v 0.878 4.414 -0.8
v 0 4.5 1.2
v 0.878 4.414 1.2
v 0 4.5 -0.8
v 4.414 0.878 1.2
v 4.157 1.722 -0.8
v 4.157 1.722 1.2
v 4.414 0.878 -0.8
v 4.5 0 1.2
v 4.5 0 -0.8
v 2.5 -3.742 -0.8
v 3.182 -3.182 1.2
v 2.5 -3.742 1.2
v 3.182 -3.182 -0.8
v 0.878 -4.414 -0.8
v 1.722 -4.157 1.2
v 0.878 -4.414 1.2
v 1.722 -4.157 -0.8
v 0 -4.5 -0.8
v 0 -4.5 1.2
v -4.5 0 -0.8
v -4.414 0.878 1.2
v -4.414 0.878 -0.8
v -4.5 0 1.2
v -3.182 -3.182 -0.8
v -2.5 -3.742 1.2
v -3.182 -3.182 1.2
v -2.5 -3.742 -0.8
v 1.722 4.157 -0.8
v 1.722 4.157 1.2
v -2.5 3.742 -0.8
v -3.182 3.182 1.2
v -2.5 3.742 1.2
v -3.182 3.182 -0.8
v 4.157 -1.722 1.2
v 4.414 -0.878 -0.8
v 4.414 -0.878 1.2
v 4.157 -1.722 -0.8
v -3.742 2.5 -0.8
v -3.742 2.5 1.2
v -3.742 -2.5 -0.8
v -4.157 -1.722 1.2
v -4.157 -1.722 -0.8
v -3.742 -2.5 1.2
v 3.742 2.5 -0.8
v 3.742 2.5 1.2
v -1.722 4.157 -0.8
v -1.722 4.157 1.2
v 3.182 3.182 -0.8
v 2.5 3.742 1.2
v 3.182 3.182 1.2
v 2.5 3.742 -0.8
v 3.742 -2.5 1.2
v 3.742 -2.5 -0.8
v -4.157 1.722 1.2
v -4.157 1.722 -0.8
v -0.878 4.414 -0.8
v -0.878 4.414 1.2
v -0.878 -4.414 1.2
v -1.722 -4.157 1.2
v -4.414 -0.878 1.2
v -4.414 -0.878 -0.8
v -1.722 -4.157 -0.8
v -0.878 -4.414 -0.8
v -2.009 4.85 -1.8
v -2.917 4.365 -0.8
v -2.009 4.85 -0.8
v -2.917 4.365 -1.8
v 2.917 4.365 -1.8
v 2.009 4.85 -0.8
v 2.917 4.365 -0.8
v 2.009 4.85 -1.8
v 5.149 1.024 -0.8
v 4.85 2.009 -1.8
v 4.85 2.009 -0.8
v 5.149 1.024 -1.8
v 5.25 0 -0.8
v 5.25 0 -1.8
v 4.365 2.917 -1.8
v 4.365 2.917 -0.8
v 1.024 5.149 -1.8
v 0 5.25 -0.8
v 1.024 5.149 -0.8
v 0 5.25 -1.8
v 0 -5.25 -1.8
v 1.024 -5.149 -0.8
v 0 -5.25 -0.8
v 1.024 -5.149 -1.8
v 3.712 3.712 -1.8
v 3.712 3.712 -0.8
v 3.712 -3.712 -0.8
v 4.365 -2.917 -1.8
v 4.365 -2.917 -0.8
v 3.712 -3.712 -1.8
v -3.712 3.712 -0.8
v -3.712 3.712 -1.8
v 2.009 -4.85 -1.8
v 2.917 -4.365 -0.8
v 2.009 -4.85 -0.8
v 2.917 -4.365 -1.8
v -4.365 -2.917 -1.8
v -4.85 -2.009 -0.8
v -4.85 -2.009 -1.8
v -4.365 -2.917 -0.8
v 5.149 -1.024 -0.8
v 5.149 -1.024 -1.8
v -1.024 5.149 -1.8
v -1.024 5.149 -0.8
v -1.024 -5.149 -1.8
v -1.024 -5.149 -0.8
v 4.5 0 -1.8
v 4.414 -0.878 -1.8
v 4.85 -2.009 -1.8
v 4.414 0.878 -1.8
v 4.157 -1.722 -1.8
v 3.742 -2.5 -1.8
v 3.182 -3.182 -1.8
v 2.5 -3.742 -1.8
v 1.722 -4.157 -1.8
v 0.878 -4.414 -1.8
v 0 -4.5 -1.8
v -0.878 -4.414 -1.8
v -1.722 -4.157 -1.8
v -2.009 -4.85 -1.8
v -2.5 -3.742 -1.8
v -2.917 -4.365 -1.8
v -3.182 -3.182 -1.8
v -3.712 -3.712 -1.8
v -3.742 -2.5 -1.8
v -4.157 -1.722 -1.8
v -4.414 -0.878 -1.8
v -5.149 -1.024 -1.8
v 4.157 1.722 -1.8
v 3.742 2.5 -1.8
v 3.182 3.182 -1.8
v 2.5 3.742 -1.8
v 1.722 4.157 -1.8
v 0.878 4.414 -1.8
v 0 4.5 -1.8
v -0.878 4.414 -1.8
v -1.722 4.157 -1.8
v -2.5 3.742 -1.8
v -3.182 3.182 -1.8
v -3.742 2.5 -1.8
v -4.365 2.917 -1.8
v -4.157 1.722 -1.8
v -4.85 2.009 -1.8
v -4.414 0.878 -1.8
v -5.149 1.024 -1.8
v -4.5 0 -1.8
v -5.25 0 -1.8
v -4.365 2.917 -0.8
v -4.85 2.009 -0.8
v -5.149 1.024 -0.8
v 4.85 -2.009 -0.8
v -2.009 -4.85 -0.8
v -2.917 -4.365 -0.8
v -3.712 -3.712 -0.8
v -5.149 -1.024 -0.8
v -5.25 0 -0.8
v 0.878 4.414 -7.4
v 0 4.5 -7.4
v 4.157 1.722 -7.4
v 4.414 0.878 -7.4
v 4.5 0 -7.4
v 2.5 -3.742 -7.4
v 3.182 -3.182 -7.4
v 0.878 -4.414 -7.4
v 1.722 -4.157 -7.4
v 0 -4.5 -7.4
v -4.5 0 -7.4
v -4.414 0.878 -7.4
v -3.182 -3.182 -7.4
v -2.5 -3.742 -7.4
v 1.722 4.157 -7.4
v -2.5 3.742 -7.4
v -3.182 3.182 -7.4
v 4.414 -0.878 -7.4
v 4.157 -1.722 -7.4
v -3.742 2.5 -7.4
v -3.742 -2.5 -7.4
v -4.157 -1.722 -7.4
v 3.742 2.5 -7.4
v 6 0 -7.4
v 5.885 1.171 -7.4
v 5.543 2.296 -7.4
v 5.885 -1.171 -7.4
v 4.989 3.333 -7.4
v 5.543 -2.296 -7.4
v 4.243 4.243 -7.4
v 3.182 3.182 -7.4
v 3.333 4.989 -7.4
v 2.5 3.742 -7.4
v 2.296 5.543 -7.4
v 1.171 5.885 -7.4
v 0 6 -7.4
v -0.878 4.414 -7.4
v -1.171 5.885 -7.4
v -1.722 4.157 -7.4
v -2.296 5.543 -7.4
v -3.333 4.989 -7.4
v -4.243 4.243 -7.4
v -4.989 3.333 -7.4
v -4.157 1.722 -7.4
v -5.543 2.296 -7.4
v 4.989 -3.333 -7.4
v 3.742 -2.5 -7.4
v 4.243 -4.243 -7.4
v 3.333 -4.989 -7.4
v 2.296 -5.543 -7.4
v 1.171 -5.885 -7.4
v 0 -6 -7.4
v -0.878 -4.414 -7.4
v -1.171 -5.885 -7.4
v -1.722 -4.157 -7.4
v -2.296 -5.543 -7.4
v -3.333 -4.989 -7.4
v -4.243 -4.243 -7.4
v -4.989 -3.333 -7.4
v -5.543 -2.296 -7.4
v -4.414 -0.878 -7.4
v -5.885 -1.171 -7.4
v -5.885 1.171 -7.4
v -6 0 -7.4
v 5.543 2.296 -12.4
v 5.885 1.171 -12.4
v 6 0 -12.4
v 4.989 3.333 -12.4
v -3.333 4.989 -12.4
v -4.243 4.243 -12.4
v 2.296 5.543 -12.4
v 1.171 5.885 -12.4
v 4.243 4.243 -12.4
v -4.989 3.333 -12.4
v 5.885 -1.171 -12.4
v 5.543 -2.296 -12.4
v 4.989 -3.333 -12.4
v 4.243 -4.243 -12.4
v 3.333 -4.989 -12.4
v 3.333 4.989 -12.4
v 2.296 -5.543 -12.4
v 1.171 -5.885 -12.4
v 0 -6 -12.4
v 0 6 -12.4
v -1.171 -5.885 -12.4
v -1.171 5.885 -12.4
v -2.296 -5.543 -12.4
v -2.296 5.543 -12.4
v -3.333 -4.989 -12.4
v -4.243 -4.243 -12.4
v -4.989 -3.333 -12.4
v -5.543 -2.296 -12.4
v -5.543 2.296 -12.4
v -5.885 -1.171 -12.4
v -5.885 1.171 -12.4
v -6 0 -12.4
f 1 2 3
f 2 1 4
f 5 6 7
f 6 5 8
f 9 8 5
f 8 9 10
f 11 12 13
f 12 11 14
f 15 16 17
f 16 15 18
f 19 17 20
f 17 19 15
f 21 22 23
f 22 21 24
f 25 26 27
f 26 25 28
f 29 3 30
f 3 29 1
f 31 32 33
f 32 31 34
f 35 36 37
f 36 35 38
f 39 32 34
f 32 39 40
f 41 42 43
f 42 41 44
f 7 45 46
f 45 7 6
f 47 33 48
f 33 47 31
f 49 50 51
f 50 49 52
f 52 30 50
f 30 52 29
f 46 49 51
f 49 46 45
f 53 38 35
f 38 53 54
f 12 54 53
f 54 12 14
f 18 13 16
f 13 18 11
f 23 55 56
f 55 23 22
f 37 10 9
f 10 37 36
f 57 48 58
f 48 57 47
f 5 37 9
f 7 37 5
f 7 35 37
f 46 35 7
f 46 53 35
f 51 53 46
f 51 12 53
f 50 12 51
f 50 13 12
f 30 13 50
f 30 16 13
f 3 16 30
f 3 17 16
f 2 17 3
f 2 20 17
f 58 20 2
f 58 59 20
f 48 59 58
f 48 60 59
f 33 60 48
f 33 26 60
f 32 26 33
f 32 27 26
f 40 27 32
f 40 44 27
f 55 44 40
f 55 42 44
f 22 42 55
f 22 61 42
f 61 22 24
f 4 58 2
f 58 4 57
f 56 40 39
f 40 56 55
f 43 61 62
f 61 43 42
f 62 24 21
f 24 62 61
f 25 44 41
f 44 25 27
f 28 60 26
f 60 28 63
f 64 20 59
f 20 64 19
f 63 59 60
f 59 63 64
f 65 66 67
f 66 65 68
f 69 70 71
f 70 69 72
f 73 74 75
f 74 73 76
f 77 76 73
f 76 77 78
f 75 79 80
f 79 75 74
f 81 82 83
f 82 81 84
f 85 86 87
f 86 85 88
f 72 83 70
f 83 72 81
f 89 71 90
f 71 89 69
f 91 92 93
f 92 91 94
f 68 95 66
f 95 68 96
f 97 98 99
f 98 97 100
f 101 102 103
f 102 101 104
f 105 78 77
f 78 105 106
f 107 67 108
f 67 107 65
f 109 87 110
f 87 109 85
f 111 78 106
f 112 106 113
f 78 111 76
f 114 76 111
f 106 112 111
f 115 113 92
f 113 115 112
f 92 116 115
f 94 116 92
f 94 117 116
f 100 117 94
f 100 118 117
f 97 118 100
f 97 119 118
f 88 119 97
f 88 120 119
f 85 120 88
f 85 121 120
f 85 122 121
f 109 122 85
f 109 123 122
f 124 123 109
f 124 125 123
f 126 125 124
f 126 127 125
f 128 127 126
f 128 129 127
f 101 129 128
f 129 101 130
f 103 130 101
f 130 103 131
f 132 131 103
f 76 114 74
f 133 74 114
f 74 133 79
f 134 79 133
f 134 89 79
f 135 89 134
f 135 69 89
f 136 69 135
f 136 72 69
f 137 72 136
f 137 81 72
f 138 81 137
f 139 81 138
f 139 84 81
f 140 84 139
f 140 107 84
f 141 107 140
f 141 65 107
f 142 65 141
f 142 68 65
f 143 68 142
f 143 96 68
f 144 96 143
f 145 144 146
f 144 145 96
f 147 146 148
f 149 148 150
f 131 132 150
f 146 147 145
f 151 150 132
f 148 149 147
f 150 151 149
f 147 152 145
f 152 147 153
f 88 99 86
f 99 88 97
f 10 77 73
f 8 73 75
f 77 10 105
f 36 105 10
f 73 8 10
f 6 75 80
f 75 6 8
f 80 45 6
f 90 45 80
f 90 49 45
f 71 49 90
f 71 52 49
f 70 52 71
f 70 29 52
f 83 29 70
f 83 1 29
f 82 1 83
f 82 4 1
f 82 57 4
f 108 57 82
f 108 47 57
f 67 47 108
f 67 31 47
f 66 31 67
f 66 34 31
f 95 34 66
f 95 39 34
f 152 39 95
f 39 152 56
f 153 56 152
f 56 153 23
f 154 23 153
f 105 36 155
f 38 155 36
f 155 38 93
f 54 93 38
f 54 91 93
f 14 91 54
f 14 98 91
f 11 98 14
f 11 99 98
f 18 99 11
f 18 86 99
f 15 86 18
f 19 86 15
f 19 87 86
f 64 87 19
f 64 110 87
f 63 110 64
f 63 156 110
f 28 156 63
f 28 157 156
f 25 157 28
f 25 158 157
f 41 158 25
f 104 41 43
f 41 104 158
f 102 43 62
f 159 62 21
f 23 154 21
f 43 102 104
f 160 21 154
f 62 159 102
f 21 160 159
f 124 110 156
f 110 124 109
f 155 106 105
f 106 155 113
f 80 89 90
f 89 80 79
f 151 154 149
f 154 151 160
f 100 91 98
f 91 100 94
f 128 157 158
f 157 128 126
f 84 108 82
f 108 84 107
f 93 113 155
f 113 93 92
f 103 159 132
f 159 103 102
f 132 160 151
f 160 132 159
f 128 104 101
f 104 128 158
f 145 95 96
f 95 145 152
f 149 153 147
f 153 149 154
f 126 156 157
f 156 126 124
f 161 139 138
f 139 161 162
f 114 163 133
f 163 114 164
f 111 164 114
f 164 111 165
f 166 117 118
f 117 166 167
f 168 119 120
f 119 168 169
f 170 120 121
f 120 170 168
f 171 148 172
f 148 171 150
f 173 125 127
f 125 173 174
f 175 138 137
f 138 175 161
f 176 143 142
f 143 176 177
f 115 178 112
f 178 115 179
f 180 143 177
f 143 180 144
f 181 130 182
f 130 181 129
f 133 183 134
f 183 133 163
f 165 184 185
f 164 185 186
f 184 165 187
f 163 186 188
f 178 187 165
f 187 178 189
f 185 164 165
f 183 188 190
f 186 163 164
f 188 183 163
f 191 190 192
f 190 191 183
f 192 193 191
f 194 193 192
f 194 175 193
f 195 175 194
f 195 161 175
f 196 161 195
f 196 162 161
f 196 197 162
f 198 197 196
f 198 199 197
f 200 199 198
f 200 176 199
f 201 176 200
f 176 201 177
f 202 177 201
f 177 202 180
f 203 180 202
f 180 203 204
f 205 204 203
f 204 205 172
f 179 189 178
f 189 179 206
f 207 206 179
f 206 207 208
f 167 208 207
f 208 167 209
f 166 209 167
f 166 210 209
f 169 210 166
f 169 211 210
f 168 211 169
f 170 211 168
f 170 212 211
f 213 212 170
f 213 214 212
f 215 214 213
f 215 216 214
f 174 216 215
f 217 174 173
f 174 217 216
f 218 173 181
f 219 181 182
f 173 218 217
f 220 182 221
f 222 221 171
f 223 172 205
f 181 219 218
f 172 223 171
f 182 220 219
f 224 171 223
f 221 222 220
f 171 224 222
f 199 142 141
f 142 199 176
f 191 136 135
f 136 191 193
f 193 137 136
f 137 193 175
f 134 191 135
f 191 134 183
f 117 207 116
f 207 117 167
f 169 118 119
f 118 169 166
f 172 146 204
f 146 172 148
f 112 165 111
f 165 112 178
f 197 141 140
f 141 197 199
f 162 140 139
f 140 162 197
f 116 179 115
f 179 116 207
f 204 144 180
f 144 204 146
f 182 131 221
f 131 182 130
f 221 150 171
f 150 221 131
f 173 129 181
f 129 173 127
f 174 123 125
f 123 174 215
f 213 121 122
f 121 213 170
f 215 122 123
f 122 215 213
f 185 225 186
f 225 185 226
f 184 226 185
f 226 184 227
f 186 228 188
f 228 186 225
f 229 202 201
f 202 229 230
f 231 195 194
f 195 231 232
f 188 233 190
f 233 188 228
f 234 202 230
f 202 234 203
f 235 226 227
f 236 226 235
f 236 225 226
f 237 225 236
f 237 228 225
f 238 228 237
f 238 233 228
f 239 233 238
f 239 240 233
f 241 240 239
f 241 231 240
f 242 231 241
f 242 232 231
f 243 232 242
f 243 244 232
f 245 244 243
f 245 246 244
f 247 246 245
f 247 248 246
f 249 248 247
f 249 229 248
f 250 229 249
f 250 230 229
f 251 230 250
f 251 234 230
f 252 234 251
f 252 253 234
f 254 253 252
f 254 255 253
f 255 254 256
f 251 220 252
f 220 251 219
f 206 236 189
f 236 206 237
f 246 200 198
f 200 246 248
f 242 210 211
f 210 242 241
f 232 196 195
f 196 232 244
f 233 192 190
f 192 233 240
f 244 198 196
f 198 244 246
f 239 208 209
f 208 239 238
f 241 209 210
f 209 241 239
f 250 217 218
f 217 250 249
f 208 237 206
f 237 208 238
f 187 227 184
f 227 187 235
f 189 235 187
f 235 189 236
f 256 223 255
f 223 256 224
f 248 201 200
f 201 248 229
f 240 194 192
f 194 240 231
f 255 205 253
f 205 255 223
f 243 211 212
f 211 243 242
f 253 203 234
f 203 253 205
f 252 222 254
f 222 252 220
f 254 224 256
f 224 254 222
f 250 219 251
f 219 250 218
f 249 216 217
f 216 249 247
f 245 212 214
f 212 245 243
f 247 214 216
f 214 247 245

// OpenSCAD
// Parameters
shaft_diameter_mm = 5; //[2.5:10:0.1]
length_under_head_mm = 10; //[5:20:0.1]
head_diameter_mm = 9; //[4.5:18:0.1]
head_height_mm = 2.4; //[1.2:4.8:0.1]
washer_diameter_mm = 10.5; //[6:21:0.1]
washer_thickness_mm = 1; //[0.5:2:0.1]
spacer_outer_diameter_mm = 9; //[5:18:0.1]
spacer_height_mm = 6; //[3:12:0.1]
buzzer_diameter_mm = 12; //[6:24:0.1]
buzzer_height_mm = 5; //[2.5:10:0.1]
overlap_mm = 0.8; //[0.5:2:0.1]

// Screw and Washer - complete geometry
module screw_and_washer() {
  color("DimGray") {
    // Shaft
    translate([0, 0, -head_height_mm/2 - length_under_head_mm/2 + overlap_mm/2])
      cylinder(h=length_under_head_mm, r=shaft_diameter_mm/2, center=true, $fn=32);
    // Head
    translate([0, 0, 0])
      cylinder(h=head_height_mm, r=head_diameter_mm/2, center=true, $fn=32);
    // Washer
    translate([0, 0, -head_height_mm/2 - washer_thickness_mm/2 + overlap_mm/2])
      cylinder(h=washer_thickness_mm, r=washer_diameter_mm/2, center=true, $fn=32);
  }
}

// PCB Spacer - complete geometry
module pcb_spacer() {
  color("Silver") {
    translate([0, 0, -head_height_mm/2 - washer_thickness_mm - spacer_height_mm/2 + overlap_mm])
      cylinder(h=spacer_height_mm, r=spacer_outer_diameter_mm/2, center=true, $fn=32);
  }
}

// Buzzer - complete geometry
module buzzer() {
  color("Black") {
    translate([0, 0, -head_height_mm/2 - washer_thickness_mm - spacer_height_mm - buzzer_height_mm/2 + overlap_mm])
      cylinder(h=buzzer_height_mm, r=buzzer_diameter_mm/2, center=true, $fn=32);
  }
}

// Assembly
module assembly() {
  screw_and_washer();
  pcb_spacer();
  buzzer();
}

assembly();
